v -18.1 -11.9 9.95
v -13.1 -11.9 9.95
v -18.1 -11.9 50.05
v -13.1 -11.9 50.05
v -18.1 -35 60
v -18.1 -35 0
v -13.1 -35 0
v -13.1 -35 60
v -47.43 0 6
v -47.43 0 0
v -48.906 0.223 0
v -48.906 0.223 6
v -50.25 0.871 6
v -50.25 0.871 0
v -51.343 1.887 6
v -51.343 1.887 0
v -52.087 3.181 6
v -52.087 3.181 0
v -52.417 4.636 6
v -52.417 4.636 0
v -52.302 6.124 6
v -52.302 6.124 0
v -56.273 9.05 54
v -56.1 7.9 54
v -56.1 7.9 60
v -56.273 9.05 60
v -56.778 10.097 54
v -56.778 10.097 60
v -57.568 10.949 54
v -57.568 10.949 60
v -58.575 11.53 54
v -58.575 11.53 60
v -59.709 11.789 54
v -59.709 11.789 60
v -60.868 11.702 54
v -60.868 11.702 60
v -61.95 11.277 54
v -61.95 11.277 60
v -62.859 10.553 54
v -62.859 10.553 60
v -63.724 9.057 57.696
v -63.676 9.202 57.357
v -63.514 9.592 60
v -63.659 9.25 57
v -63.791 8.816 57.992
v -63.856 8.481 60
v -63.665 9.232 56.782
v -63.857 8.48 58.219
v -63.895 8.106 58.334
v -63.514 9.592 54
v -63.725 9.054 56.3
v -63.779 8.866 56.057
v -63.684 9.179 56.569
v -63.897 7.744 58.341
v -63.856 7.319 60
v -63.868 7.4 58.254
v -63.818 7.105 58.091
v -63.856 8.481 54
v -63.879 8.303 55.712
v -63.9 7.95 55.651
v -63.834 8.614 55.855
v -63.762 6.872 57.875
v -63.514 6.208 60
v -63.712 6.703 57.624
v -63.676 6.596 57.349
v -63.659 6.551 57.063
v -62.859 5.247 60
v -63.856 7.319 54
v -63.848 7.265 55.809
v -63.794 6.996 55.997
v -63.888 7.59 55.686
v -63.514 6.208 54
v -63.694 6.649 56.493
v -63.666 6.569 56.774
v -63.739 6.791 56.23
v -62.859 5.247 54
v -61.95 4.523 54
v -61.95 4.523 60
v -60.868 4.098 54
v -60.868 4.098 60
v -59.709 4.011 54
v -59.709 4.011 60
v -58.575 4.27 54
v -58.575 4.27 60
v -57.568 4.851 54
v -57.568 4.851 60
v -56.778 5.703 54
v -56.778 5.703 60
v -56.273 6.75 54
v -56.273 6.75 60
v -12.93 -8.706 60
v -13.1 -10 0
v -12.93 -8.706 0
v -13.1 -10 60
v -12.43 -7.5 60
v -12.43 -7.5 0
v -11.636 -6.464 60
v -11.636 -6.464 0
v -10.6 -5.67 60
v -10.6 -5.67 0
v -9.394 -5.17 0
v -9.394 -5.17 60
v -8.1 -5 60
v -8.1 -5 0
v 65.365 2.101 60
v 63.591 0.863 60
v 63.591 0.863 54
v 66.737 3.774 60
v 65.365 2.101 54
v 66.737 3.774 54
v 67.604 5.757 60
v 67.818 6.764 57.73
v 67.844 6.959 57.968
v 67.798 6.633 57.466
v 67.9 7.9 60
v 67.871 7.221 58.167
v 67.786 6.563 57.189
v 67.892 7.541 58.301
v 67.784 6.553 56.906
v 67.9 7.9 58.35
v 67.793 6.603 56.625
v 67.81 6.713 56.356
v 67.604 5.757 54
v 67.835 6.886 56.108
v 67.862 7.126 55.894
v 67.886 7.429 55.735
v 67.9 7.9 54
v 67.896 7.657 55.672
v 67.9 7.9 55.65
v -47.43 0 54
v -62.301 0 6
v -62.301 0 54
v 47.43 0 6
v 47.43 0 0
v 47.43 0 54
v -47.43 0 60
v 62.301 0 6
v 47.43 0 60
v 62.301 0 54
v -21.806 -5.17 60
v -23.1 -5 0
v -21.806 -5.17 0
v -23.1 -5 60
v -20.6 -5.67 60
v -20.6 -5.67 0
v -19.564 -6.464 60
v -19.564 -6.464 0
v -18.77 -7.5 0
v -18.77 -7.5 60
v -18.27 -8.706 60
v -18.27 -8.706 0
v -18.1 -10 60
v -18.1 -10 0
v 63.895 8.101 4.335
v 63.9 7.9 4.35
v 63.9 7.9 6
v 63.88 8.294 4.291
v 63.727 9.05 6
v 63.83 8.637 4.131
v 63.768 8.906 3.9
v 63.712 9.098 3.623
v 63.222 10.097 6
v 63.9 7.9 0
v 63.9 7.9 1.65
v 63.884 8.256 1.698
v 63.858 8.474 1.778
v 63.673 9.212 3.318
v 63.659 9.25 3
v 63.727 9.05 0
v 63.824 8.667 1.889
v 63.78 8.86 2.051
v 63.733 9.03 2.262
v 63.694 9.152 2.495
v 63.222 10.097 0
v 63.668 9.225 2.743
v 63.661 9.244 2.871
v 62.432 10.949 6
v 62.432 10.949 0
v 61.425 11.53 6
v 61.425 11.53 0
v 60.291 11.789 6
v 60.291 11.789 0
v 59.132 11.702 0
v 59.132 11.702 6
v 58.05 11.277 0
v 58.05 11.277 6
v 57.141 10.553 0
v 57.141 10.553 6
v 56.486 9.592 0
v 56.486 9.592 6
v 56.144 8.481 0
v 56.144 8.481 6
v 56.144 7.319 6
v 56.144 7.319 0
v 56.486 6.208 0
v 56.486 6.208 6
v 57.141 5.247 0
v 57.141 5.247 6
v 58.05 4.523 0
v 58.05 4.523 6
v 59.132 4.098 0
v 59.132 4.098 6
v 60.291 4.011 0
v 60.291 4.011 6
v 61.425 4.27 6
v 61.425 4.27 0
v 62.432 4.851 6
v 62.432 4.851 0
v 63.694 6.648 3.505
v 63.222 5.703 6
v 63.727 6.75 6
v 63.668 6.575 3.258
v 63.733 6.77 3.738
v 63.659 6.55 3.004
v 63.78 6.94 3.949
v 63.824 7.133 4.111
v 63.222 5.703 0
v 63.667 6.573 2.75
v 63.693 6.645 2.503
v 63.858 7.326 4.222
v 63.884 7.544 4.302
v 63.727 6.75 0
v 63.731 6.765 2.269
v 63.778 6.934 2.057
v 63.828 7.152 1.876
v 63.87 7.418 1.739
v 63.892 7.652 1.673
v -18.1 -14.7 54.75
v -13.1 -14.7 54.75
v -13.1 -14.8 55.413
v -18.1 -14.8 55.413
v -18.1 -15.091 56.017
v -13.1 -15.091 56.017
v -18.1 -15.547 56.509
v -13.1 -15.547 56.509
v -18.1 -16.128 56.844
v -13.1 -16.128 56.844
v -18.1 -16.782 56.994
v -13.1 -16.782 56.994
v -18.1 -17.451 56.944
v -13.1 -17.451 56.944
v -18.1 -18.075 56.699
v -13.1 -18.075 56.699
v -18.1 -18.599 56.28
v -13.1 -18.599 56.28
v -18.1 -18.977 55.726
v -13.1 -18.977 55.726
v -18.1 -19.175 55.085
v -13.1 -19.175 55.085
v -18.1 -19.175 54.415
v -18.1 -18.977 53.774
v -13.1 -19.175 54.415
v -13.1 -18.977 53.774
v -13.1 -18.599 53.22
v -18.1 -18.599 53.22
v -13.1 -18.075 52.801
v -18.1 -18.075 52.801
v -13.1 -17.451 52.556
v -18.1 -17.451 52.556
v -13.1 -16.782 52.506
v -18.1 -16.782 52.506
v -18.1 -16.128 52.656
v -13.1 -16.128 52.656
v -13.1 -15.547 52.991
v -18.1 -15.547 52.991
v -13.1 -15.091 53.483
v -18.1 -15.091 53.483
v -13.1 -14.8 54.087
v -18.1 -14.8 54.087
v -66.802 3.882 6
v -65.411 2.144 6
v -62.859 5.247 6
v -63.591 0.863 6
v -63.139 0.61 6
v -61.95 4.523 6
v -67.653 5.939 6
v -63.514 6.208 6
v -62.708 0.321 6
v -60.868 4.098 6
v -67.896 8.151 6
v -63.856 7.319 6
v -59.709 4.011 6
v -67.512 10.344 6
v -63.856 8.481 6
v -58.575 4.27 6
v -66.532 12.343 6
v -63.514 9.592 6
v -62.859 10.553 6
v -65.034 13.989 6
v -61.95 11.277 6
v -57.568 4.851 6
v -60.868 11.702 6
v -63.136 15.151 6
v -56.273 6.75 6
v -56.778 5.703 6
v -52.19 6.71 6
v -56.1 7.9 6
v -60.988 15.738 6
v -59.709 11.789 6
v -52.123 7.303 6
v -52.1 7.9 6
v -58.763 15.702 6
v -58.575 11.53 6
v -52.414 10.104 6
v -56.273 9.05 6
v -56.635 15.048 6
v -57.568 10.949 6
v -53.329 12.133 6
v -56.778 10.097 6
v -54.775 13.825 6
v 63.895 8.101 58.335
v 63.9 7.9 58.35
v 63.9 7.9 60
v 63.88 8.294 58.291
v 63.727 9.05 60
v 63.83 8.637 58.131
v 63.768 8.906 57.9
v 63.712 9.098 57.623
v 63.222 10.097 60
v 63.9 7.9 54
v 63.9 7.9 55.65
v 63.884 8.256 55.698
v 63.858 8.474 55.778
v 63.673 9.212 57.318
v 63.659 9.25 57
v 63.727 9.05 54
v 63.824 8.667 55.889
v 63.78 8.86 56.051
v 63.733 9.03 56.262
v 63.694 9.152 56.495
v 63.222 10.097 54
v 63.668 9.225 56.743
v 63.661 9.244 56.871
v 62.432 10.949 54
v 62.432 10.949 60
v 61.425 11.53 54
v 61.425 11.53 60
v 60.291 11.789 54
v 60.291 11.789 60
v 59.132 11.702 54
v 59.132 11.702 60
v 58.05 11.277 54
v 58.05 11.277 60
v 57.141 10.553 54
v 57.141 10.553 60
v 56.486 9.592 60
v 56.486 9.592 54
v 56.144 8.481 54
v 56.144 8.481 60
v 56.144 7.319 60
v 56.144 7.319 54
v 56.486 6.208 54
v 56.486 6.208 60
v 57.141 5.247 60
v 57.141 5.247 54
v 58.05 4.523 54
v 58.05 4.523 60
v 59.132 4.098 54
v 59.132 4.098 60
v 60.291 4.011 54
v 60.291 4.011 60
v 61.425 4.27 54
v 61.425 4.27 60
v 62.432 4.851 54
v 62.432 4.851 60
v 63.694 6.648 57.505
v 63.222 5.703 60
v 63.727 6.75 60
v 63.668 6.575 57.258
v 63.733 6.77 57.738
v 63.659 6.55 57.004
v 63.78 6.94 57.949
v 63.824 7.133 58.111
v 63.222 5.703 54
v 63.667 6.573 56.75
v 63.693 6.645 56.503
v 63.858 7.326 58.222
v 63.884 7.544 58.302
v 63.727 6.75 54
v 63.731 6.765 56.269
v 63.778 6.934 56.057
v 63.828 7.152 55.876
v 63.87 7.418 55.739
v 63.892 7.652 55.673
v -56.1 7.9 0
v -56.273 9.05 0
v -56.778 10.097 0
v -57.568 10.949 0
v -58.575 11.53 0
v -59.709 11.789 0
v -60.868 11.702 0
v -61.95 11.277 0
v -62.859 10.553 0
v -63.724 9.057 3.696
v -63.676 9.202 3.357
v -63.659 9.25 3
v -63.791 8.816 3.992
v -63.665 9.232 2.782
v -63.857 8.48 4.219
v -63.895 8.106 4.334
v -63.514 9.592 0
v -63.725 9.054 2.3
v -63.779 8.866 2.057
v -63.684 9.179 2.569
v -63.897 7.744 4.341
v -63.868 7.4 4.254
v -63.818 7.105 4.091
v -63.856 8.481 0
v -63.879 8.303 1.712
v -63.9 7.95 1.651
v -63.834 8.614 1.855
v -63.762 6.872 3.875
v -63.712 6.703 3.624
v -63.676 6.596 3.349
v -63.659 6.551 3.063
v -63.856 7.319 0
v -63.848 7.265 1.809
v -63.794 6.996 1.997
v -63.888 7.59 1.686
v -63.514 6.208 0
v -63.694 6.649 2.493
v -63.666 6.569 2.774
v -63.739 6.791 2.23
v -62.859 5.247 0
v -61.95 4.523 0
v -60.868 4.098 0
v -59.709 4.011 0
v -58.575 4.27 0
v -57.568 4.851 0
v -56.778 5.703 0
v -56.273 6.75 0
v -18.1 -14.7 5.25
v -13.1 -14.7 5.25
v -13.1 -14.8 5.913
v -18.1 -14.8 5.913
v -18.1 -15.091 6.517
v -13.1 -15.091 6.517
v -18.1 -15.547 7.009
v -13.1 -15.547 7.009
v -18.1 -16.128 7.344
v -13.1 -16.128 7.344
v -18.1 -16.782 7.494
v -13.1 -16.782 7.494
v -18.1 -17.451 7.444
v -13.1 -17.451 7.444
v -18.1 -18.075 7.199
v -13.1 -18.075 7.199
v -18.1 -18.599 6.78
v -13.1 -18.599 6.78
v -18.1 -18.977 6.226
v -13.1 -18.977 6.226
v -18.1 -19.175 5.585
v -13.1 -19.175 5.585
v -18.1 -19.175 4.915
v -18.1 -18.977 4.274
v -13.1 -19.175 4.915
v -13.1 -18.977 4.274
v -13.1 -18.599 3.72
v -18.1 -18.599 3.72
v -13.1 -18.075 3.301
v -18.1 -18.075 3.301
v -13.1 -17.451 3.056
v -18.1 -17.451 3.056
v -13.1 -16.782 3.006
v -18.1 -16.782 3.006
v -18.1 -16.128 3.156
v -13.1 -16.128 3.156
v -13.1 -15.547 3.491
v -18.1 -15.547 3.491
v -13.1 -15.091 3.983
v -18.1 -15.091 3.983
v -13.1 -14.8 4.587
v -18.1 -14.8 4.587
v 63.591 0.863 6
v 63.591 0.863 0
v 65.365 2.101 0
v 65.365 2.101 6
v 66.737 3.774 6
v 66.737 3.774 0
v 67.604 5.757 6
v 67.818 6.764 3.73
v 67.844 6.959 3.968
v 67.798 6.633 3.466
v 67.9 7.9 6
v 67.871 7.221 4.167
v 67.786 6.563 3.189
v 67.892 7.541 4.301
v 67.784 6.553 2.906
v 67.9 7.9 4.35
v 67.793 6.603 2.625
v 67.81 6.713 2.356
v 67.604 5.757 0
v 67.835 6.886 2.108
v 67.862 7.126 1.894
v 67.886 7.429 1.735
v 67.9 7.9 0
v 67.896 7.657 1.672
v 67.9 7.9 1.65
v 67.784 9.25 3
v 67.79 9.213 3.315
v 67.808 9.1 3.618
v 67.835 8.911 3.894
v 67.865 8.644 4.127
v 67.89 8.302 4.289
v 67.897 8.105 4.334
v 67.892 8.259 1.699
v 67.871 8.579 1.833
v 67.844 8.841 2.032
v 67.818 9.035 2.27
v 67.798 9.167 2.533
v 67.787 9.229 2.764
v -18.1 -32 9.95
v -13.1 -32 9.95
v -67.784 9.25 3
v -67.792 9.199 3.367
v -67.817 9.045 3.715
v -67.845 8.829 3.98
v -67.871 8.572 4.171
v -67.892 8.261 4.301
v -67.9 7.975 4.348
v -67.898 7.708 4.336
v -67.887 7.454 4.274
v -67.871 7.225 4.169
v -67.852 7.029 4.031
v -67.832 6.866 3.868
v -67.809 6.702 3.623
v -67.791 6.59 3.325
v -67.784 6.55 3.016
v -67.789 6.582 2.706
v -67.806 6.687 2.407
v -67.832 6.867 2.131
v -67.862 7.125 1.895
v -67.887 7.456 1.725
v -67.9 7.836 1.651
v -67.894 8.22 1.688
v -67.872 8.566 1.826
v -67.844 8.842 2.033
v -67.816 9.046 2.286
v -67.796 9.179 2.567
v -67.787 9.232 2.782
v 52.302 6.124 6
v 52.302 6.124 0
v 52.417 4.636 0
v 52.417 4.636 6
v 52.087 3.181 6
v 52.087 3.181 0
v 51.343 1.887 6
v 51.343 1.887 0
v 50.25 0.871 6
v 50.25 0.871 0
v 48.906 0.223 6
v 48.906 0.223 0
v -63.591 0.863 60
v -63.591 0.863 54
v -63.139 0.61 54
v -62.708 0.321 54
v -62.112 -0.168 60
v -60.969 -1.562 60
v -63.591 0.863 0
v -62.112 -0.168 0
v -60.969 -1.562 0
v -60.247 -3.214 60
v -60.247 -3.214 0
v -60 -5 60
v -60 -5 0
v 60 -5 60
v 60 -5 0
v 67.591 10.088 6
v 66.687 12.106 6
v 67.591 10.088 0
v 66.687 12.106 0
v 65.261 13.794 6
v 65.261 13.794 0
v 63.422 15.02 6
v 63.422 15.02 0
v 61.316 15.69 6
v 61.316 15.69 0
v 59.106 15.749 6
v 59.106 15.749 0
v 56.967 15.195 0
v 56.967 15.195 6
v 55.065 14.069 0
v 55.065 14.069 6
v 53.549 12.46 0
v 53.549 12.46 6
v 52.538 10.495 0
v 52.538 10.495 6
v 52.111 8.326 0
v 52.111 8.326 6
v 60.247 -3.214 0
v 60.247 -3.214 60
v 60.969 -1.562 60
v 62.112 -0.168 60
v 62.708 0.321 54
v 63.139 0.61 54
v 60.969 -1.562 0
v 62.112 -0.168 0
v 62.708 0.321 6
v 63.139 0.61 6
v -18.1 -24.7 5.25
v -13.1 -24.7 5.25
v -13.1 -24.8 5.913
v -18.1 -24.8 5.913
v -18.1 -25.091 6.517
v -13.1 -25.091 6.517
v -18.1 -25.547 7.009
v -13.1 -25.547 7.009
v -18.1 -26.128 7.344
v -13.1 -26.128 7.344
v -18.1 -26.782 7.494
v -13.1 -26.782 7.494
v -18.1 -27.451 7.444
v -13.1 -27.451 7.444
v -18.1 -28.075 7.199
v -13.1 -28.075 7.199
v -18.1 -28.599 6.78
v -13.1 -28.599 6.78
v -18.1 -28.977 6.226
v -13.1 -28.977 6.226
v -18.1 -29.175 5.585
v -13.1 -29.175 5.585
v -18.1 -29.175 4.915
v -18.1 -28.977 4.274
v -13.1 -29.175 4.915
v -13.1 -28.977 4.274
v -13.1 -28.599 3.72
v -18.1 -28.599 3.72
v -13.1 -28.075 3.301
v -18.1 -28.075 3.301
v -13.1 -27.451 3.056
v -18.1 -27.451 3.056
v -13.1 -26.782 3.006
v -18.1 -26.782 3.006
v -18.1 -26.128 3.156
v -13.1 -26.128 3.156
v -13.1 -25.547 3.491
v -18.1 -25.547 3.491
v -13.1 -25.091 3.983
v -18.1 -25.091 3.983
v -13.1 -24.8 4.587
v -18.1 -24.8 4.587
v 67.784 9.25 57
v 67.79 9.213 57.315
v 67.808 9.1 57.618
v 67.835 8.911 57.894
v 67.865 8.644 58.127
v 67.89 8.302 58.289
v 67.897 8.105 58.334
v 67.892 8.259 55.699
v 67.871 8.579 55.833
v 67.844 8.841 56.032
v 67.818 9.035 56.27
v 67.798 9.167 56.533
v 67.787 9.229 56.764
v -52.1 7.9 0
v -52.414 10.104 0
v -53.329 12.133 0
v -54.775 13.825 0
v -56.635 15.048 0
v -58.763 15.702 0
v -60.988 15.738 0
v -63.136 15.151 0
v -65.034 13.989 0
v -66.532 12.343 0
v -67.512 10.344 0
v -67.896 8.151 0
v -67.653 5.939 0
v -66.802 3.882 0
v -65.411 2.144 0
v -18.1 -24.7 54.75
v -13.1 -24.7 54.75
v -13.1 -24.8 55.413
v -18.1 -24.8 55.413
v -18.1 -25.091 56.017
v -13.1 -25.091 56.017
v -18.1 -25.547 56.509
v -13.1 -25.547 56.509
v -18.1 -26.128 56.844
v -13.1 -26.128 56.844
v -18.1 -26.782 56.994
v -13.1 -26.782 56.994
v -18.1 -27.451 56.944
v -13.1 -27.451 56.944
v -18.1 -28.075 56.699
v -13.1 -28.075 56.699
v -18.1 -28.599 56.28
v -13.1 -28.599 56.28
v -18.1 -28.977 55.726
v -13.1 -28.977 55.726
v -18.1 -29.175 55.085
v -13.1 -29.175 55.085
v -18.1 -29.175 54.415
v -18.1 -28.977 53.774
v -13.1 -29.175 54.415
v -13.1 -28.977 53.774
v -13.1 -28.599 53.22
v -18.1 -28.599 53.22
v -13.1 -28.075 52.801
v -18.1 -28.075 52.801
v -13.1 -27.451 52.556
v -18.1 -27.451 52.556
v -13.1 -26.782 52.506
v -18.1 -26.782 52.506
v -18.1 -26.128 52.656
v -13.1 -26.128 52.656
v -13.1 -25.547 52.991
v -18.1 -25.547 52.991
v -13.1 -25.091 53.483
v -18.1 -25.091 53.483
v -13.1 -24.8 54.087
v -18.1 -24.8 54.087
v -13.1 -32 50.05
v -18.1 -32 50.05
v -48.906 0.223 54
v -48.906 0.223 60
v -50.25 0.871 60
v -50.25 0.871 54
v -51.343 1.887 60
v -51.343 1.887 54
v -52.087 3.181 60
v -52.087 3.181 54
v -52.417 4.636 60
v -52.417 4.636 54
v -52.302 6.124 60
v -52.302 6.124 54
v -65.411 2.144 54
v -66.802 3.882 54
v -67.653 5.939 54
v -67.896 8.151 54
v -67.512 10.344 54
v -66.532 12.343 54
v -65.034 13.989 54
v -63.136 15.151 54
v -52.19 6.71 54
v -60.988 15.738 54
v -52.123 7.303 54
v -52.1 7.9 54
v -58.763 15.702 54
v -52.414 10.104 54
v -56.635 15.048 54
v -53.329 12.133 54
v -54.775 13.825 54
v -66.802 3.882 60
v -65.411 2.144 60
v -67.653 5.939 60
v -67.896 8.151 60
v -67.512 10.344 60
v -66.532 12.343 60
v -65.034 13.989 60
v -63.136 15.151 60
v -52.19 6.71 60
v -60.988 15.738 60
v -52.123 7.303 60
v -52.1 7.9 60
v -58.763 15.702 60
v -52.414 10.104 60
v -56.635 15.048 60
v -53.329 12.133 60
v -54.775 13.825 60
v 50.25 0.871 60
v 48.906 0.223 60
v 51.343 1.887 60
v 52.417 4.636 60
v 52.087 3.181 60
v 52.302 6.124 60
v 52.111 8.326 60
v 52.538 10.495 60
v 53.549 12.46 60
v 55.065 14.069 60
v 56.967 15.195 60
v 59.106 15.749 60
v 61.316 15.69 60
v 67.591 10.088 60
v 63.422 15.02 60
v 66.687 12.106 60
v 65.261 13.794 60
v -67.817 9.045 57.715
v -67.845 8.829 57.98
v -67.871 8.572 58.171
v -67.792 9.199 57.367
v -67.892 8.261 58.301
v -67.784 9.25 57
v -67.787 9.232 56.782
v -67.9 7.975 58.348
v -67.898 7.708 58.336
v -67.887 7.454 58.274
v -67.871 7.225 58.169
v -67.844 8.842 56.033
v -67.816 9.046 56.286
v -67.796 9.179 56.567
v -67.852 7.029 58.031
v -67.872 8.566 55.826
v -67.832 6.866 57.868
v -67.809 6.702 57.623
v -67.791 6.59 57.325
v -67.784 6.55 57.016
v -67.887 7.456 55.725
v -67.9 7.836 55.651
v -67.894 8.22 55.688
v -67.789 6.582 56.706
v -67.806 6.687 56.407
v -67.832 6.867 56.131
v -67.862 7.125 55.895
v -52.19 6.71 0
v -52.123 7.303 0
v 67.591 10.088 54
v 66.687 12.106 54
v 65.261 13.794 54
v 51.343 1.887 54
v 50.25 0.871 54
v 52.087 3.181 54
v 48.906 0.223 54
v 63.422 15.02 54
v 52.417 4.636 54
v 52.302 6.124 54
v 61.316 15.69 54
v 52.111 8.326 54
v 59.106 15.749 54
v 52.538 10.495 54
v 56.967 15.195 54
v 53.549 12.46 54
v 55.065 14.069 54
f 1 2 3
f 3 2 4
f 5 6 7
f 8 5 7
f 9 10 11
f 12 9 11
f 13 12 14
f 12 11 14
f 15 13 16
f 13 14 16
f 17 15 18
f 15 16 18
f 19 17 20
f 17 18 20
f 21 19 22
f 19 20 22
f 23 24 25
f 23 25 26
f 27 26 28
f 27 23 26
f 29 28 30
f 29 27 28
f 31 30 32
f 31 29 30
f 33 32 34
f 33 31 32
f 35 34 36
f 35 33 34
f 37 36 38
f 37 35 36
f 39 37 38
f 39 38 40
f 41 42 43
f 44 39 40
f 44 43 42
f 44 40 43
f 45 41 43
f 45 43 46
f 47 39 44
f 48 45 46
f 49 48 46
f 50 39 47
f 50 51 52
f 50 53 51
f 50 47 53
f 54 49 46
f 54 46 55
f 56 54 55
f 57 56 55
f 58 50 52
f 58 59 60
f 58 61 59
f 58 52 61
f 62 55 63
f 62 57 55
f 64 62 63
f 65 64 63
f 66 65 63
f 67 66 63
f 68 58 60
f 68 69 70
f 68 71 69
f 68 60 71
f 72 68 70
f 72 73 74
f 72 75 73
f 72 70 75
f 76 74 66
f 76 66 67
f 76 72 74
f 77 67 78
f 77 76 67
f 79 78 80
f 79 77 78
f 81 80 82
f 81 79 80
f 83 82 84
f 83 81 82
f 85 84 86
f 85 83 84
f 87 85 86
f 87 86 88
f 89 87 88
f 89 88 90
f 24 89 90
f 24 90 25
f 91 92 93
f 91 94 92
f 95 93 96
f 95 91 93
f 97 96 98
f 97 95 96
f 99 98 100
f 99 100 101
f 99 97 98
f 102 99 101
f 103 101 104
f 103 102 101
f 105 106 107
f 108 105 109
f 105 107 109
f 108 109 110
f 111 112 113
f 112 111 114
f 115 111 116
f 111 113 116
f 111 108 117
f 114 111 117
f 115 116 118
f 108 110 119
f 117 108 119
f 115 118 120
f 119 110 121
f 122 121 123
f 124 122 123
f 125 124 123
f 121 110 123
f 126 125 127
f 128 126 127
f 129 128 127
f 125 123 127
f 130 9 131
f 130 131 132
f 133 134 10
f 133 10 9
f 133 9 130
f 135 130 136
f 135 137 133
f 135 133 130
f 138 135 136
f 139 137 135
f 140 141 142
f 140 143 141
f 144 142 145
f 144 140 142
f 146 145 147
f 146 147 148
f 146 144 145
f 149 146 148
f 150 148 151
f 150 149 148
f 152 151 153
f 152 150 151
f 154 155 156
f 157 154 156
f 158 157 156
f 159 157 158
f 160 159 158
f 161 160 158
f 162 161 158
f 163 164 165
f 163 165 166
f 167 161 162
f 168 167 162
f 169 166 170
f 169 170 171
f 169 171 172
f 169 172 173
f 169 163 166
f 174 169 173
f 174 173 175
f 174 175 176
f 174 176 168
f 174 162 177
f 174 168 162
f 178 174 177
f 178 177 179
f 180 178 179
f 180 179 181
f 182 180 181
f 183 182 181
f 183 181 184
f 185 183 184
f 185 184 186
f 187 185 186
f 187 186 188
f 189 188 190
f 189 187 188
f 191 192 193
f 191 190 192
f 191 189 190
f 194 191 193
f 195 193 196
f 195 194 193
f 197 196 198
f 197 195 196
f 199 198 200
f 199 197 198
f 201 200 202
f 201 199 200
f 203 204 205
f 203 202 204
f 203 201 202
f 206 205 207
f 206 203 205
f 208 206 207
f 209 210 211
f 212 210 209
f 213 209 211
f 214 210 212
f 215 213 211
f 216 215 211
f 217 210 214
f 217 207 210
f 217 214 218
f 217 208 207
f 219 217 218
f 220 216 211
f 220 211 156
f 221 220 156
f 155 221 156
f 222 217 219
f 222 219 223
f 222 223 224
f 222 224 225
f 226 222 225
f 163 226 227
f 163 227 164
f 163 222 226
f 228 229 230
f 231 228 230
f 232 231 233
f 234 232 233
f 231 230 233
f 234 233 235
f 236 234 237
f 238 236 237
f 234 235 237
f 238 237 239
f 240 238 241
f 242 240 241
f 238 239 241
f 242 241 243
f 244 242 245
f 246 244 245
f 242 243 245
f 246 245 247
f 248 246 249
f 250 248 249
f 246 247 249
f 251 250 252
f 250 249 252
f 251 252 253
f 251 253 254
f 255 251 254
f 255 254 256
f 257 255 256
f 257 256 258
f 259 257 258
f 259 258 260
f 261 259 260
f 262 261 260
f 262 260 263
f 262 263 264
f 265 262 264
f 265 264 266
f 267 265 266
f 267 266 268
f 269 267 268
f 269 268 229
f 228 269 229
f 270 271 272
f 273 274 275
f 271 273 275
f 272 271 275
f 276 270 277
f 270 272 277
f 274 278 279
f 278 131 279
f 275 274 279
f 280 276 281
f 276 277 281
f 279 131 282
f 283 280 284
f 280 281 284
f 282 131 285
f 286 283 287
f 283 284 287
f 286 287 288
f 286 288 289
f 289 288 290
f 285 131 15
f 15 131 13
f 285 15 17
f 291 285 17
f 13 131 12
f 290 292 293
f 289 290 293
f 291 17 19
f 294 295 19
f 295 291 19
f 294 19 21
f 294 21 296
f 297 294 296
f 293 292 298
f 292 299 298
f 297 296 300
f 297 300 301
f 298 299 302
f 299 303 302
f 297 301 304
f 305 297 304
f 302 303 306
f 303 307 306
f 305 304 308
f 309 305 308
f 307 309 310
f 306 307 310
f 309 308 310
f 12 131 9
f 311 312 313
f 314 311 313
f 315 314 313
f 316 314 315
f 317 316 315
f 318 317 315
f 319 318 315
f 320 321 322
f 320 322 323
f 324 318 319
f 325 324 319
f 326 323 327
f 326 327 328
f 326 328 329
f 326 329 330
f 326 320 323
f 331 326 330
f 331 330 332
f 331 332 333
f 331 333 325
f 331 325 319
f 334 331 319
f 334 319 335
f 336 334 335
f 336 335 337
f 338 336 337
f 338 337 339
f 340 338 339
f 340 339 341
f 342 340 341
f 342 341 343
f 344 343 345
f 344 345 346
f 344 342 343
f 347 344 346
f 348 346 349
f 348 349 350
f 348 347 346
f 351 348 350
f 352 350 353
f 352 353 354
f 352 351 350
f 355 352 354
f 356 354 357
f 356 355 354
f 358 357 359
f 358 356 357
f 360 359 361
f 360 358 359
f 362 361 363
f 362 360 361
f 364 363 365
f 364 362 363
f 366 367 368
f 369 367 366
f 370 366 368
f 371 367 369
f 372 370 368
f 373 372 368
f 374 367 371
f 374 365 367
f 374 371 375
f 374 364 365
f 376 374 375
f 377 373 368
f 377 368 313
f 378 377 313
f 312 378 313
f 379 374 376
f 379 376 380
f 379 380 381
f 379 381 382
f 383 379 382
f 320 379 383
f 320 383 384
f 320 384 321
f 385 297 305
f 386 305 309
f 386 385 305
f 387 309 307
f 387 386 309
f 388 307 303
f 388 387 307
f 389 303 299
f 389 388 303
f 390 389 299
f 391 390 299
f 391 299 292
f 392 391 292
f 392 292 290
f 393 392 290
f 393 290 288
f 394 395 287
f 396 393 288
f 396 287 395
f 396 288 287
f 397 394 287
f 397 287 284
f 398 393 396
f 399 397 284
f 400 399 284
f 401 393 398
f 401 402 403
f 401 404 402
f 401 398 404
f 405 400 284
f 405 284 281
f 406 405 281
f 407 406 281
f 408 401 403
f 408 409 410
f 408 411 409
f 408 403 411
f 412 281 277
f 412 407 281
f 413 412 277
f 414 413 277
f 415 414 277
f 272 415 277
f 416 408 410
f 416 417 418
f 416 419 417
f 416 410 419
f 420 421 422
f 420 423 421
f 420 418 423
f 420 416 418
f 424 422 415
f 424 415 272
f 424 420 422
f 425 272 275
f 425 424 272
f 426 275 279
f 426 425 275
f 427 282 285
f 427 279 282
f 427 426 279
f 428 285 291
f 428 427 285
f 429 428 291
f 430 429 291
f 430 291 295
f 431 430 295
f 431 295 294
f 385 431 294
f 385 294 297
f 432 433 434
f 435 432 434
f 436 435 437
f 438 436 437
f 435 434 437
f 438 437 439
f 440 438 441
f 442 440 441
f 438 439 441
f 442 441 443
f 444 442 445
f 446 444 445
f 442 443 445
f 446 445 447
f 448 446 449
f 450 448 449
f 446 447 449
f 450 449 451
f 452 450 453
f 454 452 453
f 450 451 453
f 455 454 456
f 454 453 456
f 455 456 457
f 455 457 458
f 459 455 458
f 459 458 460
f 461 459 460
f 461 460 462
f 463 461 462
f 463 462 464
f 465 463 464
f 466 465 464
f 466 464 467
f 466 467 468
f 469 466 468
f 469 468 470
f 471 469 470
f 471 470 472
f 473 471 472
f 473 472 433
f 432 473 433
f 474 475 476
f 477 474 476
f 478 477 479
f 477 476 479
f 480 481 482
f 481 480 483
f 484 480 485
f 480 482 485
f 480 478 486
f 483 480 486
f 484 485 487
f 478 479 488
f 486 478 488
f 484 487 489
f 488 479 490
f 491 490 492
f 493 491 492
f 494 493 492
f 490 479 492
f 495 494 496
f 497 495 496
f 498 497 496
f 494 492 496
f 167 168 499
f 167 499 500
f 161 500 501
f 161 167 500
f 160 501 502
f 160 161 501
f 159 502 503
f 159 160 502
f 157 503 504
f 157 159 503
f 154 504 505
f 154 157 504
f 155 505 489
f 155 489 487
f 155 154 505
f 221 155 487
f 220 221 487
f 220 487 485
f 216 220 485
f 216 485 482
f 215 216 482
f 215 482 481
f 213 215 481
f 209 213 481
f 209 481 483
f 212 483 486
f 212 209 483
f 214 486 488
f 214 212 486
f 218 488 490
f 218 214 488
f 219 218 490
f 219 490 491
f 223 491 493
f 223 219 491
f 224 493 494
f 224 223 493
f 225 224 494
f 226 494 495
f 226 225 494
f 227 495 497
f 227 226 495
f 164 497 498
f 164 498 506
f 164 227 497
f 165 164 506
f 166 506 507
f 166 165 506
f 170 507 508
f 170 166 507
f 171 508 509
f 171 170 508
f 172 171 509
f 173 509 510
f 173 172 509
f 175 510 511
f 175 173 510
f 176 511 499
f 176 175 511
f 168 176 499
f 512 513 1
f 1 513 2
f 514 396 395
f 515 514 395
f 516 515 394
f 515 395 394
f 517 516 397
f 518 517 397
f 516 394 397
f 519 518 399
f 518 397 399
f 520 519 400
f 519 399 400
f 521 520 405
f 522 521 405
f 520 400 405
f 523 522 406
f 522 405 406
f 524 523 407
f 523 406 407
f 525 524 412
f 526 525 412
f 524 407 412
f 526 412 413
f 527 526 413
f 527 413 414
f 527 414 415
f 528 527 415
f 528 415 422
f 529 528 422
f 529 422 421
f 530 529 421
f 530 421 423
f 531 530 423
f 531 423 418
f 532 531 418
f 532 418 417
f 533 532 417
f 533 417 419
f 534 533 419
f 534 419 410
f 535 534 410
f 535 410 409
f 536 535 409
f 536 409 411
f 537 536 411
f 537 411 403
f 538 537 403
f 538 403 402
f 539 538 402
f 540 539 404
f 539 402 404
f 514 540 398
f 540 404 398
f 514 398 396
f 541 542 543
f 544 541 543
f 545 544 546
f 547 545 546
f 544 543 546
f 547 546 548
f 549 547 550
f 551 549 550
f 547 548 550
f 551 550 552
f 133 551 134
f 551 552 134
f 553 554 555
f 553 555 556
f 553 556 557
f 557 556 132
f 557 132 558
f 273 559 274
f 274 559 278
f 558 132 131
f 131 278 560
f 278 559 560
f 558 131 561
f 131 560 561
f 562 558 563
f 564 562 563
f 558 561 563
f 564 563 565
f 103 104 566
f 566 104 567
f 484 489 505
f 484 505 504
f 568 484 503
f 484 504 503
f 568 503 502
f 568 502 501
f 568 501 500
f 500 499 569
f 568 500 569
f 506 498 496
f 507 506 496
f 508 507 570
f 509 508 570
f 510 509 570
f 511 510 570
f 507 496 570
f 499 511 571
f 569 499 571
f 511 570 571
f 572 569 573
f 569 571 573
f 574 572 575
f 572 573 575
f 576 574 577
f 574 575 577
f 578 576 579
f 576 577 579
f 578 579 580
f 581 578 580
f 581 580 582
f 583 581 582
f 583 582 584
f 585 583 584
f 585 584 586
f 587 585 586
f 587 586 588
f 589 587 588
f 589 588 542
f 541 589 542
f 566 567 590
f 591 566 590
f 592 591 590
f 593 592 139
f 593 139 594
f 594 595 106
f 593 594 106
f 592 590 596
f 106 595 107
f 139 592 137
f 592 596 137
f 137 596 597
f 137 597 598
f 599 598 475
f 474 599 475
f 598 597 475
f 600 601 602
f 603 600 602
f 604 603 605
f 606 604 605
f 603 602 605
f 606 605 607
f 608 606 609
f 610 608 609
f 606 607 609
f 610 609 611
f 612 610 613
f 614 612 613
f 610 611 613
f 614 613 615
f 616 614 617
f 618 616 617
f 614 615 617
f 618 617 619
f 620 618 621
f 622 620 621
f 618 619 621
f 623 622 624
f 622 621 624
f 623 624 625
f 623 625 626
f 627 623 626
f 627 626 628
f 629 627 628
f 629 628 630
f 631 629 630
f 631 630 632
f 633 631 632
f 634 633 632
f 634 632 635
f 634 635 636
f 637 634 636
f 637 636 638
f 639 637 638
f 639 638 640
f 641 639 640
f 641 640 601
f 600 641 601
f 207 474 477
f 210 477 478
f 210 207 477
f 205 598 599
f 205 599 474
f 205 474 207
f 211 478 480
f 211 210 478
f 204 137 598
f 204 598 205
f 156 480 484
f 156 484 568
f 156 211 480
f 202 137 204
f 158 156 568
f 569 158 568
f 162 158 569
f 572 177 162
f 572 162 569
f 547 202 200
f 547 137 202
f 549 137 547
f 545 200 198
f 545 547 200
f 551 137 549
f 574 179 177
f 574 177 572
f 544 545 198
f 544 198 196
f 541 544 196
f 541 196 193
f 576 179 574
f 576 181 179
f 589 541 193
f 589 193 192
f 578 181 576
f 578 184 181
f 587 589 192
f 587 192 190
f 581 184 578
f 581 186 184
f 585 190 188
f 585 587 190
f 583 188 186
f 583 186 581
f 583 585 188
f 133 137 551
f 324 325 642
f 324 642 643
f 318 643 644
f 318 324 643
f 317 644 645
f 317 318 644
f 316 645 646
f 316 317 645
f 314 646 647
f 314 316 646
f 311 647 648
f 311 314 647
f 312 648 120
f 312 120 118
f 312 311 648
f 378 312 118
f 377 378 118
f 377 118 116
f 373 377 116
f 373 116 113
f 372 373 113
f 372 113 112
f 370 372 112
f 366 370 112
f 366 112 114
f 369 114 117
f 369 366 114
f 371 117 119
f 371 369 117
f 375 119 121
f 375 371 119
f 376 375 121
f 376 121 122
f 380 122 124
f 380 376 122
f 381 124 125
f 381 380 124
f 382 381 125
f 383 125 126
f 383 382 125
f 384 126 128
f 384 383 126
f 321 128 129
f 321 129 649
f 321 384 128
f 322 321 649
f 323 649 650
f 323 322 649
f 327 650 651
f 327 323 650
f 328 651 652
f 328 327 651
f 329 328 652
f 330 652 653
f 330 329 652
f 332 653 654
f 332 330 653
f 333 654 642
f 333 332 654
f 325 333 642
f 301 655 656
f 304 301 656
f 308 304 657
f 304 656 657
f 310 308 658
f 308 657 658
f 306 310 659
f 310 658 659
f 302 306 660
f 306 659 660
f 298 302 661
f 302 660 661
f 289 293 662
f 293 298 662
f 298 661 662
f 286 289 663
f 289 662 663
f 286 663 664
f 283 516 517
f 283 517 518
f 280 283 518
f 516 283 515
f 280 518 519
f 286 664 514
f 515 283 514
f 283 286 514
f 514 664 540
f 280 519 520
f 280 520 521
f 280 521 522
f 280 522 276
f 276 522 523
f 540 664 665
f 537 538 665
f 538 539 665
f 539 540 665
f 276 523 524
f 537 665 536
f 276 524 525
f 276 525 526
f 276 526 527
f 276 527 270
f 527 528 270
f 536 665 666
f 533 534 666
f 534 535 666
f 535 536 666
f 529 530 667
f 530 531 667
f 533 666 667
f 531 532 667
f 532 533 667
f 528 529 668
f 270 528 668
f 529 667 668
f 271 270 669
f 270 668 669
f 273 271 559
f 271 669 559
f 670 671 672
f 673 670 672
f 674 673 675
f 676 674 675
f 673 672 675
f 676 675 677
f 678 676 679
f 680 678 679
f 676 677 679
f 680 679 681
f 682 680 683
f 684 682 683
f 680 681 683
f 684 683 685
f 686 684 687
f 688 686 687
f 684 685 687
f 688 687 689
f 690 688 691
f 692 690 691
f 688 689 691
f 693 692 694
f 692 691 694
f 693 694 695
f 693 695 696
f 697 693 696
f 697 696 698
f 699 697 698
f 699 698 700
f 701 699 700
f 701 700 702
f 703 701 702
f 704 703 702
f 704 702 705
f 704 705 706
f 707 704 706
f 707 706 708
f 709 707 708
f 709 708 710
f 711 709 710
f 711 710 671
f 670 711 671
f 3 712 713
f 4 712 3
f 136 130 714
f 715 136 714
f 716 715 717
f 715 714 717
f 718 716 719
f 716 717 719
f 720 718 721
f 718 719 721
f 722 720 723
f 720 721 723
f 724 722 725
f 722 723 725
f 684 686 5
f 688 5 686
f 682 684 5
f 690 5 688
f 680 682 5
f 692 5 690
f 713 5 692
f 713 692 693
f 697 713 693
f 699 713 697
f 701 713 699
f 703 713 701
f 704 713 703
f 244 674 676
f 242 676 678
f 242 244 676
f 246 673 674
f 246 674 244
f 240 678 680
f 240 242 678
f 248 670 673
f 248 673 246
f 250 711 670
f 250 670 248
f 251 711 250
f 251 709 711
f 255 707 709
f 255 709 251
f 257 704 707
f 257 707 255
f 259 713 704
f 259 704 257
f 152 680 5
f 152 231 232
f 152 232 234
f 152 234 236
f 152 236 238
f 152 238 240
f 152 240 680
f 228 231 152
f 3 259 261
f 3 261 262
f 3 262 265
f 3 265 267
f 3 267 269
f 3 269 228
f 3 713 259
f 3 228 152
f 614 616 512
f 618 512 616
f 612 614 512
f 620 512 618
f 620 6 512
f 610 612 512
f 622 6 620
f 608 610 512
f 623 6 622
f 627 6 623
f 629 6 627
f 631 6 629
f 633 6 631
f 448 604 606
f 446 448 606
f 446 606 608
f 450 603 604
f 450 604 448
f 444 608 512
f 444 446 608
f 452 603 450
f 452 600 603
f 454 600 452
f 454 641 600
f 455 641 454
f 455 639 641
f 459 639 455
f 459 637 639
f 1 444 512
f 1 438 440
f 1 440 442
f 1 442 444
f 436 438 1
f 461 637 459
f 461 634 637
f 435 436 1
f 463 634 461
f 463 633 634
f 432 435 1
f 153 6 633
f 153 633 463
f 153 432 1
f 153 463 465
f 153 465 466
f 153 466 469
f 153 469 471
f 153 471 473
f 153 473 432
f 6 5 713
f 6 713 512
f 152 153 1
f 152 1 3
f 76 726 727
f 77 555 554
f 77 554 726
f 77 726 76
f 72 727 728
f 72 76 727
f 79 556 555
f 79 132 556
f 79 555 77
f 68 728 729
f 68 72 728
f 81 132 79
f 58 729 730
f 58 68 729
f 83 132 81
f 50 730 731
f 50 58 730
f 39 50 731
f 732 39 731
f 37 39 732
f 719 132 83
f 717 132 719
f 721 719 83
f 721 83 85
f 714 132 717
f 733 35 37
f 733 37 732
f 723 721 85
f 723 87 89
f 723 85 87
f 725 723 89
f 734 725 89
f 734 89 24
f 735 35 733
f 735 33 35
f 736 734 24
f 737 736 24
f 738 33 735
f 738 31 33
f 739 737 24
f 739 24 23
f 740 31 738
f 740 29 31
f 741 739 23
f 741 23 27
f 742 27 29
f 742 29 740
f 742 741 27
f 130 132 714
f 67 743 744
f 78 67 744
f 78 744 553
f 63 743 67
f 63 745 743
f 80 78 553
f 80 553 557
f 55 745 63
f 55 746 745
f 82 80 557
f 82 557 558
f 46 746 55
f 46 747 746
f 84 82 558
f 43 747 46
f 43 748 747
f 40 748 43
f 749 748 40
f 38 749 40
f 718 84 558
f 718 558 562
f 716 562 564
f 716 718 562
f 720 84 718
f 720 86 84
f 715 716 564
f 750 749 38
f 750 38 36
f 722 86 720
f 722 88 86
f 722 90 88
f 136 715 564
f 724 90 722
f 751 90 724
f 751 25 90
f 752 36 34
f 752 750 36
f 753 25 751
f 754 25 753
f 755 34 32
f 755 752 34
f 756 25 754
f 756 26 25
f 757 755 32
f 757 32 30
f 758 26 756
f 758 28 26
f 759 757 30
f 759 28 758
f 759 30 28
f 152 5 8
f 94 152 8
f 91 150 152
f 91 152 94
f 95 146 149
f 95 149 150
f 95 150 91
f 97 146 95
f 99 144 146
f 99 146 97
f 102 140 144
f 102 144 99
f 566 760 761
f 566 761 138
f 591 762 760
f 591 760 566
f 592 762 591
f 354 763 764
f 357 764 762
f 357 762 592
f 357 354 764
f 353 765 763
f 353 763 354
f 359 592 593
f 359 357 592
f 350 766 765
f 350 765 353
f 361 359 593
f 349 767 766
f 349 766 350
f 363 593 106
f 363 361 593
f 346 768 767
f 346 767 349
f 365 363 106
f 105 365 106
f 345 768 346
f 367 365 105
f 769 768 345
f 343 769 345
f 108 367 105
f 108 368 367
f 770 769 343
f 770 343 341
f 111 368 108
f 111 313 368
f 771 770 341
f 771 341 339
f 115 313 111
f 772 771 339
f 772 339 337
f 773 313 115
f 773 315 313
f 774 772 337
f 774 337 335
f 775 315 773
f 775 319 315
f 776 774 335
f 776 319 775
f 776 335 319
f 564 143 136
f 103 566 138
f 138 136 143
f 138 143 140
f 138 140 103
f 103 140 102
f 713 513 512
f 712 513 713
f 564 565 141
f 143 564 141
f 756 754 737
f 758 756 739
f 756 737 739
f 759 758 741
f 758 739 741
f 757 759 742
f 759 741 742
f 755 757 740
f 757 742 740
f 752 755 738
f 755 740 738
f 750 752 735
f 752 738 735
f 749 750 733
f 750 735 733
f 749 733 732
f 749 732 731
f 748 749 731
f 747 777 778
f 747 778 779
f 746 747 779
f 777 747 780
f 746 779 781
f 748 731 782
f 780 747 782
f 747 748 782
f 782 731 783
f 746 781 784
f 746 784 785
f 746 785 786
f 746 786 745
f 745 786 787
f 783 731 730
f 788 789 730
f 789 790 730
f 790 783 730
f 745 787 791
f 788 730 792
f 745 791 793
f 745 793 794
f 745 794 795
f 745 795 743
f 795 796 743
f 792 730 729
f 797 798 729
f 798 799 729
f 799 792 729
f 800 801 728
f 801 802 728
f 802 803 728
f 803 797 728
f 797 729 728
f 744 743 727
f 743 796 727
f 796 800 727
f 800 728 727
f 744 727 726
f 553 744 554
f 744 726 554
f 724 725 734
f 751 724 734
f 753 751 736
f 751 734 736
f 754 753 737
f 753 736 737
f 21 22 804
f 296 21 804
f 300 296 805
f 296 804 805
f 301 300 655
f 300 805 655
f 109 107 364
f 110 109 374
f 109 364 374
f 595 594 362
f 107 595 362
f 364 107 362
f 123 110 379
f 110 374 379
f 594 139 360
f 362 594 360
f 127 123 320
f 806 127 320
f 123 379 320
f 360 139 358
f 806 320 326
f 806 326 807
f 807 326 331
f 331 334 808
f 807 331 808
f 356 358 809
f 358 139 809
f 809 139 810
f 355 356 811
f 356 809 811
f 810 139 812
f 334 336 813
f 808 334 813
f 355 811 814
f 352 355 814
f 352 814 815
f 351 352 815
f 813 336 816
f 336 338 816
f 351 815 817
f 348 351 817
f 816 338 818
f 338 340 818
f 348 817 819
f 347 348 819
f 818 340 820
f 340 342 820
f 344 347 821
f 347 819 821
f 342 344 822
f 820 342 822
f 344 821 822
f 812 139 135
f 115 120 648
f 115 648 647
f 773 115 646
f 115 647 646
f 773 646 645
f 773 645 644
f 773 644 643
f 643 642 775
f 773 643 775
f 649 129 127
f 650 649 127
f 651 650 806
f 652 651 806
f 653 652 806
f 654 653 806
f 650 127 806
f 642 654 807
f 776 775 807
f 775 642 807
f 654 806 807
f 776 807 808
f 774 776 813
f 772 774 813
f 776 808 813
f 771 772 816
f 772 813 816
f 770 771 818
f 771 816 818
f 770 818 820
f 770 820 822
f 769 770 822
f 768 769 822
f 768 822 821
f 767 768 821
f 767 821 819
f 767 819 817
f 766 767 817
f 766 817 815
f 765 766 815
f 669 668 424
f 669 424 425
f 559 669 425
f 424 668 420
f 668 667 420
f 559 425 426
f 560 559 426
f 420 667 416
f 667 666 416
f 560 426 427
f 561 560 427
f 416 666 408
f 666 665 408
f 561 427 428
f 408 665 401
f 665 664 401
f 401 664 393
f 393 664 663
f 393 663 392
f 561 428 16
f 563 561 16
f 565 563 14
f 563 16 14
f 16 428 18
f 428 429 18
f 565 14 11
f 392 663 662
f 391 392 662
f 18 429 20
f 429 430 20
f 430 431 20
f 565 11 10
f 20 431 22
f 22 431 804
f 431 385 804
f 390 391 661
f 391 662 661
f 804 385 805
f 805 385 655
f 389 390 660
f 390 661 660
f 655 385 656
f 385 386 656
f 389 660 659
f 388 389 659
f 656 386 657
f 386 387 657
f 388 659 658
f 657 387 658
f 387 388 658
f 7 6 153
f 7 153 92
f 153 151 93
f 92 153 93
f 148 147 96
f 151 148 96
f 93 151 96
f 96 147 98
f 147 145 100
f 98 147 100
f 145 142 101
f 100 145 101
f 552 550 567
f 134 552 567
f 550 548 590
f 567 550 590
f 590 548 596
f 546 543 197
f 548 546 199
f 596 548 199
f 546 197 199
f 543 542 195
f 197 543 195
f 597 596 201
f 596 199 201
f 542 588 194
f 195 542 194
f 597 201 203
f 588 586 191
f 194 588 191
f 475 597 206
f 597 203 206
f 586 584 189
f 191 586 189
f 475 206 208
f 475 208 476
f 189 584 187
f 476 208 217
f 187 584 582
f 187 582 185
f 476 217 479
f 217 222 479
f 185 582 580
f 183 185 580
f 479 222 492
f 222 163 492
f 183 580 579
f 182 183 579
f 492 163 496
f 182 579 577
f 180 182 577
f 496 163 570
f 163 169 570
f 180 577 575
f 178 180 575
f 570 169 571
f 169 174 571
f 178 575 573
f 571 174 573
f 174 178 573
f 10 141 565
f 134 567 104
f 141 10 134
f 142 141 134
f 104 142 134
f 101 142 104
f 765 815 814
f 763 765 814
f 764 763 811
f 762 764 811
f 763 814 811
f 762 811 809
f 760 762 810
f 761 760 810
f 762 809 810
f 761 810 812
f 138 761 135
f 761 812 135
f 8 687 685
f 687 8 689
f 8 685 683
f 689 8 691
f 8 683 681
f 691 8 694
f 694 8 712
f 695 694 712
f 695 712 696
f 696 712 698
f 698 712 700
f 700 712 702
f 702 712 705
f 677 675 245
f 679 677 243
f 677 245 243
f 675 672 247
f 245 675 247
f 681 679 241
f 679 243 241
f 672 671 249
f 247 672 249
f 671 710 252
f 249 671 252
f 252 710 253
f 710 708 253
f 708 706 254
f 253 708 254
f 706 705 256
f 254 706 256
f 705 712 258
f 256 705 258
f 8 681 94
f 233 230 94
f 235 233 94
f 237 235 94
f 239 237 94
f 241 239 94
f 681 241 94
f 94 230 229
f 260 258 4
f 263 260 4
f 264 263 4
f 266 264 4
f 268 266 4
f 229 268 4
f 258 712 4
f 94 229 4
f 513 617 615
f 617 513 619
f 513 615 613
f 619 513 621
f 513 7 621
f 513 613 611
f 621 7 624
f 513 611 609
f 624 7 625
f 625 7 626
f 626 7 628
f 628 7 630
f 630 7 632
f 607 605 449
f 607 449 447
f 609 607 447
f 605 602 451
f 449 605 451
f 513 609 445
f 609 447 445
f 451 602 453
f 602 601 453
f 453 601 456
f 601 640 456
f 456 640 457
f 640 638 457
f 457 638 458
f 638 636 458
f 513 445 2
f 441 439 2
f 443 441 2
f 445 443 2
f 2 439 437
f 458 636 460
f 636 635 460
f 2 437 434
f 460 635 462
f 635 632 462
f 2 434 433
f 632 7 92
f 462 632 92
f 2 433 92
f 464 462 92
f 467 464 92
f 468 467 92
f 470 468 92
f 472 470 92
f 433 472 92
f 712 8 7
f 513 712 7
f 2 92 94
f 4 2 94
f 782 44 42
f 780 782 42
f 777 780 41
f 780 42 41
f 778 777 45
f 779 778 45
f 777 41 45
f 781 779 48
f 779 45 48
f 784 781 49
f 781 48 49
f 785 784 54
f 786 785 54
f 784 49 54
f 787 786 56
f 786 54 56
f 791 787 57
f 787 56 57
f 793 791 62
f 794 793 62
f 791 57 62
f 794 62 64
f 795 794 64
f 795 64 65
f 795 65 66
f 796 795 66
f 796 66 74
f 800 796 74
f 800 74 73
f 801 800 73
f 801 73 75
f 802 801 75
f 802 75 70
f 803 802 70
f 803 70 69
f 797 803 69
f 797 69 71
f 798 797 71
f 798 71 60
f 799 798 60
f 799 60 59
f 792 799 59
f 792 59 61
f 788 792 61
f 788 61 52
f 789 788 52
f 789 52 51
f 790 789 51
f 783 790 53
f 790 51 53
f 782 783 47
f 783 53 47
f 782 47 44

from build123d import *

# Parameters (mm, degrees)
F0_R          = 3.9
F0_W          = 5
F0_H          = 30
F1_DEPTH      = 60
F2_W          = 20.1
F2_H          = 40.1
F2_R          = 2.25
F3_DEPTH      = 54.801
F5_W          = 34.2169012874
F5_H          = 48
F6_DEPTH      = 67.901
F6_DEPTH_BACK = 67.901
F7_R          = 5
F9_R          = 1.35
F10_DEPTH     = 7.901


# Not quite as in the source:
# - a pattern or mirror of a feature is missing from the dataset's text; its kind, count and spacing are read off the source's solid


with BuildPart() as f1:
    # F0 (on Top) → F1 (new body)
    with BuildSketch(Plane.XY):
        with BuildLine():
            ThreePointArc((-52.3022123868, 6.1240310078), (-55.0816748297, 1.717761124), (-60, 0))
            Line((-60, 0), (-47.43019491, 0))
            ThreePointArc((-47.43019491, 0), (-51.3430043252, 1.8871359682), (-52.3022123868, 6.1240310078))
        make_face()
        Polygon((-47.43019491, 0), (-60, 0), (-60, -5), (-18.1, -5), (-13.1, -5), (60, -5), (60, 0), (47.43019491, 0), align=None)
        with BuildLine():
            Line((-60, -5), (-60, 0))
            ThreePointArc((-60, 0), (-61.846439606, 0.218811239), (-63.5905952277, 0.8631238528))
            ThreePointArc((-63.5905952277, 0.8631238528), (-60.9689691941, -1.5623919871), (-60, -5))
        make_face()
        with BuildLine():
            ThreePointArc((-63.5905952277, 0.8631238528), (-61.846439606, 0.218811239), (-60, 0))
            ThreePointArc((-60, 0), (-55.0816748297, 1.717761124), (-52.3022123868, 6.1240310078))
            ThreePointArc((-52.3022123868, 6.1240310078), (-52.1507158879, 7.0062780479), (-52.1, 7.9))
            ThreePointArc((-52.1, 7.9), (-64.125790694, 14.6370506269), (-63.5905952277, 0.8631238528))
        make_face()
        with Locations((-60, 7.9)):
            Circle(F0_R, mode=Mode.SUBTRACT)
        with BuildLine():
            ThreePointArc((52.3022123868, 6.1240310078), (51.3430043252, 1.8871359682), (47.43019491, 0))
            Line((47.43019491, 0), (60, 0))
            ThreePointArc((60, 0), (55.0816748297, 1.717761124), (52.3022123868, 6.1240310078))
        make_face()
        with Locations((-15.6, -20)):
            Rectangle(F0_W, F0_H)
        with BuildLine():
            ThreePointArc((63.5905952277, 0.8631238528), (61.846439606, 0.218811239), (60, 0))
            Line((60, 0), (60, -5))
            ThreePointArc((60, -5), (60.9689691941, -1.5623919871), (63.5905952277, 0.8631238528))
        make_face()
        with BuildLine():
            ThreePointArc((52.3022123868, 6.1240310078), (55.0816748297, 1.717761124), (60, 0))
            ThreePointArc((60, 0), (61.846439606, 0.218811239), (63.5905952277, 0.8631238528))
            ThreePointArc((63.5905952277, 0.8631238528), (66.7370506269, 3.774209306), (67.9, 7.9))
            ThreePointArc((67.9, 7.9), (59.1062780479, 15.7492841121), (52.3022123868, 6.1240310078))
        make_face()
        with Locations((60, 7.9)):
            Circle(F0_R, mode=Mode.SUBTRACT)
    extrude(amount=F1_DEPTH)

    # F2 (on face) → F3 (cut, through all)
    with BuildSketch(Plane.YZ.offset(-13.1)):
        with Locations((-21.95, 30)):
            Rectangle(F2_W, F2_H)
        with Locations((-26.95, 54.75)):
            Circle(F2_R)
        with Locations((-16.95, 54.75)):
            Circle(F2_R)
        with Locations((-16.95, 5.25)):
            Circle(F2_R)
        with Locations((-26.95, 5.25)):
            Circle(F2_R)
    extrude(amount=-F3_DEPTH, mode=Mode.SUBTRACT)

    # F5 (on Right) → F6 (cut, two sides)
    with BuildSketch(Plane.YZ) as f6_sk:
        with Locations((17.1084506437, 30)):
            Rectangle(F5_W, F5_H)
    extrude(amount=-F6_DEPTH, mode=Mode.SUBTRACT)
    extrude(f6_sk.sketch, amount=F6_DEPTH_BACK, mode=Mode.SUBTRACT)

    # F7
    f7_edges = [f1.edges().sort_by_distance(p)[0] for p in [
        (-13.1, -5, 30),
        (-18.1, -5, 30),
    ]]
    fillet(f7_edges, radius=F7_R)

    # F9 (on offset) → F10 (cut, through all)
    with BuildSketch(Plane.YZ.offset(60)):
        with Locations((7.9, 57)):
            Circle(F9_R)
        with Locations((7.9, 3)):
            Circle(F9_R)
    f10 = extrude(amount=F10_DEPTH, mode=Mode.SUBTRACT)

    # F10_copies: F10 across plane
    add(f10.mirror(Plane(origin=(-5e-06, 0, 0), x_dir=(0, 0, -1), z_dir=(-1, 0, 0))), mode=Mode.SUBTRACT)


solid = f1.part
